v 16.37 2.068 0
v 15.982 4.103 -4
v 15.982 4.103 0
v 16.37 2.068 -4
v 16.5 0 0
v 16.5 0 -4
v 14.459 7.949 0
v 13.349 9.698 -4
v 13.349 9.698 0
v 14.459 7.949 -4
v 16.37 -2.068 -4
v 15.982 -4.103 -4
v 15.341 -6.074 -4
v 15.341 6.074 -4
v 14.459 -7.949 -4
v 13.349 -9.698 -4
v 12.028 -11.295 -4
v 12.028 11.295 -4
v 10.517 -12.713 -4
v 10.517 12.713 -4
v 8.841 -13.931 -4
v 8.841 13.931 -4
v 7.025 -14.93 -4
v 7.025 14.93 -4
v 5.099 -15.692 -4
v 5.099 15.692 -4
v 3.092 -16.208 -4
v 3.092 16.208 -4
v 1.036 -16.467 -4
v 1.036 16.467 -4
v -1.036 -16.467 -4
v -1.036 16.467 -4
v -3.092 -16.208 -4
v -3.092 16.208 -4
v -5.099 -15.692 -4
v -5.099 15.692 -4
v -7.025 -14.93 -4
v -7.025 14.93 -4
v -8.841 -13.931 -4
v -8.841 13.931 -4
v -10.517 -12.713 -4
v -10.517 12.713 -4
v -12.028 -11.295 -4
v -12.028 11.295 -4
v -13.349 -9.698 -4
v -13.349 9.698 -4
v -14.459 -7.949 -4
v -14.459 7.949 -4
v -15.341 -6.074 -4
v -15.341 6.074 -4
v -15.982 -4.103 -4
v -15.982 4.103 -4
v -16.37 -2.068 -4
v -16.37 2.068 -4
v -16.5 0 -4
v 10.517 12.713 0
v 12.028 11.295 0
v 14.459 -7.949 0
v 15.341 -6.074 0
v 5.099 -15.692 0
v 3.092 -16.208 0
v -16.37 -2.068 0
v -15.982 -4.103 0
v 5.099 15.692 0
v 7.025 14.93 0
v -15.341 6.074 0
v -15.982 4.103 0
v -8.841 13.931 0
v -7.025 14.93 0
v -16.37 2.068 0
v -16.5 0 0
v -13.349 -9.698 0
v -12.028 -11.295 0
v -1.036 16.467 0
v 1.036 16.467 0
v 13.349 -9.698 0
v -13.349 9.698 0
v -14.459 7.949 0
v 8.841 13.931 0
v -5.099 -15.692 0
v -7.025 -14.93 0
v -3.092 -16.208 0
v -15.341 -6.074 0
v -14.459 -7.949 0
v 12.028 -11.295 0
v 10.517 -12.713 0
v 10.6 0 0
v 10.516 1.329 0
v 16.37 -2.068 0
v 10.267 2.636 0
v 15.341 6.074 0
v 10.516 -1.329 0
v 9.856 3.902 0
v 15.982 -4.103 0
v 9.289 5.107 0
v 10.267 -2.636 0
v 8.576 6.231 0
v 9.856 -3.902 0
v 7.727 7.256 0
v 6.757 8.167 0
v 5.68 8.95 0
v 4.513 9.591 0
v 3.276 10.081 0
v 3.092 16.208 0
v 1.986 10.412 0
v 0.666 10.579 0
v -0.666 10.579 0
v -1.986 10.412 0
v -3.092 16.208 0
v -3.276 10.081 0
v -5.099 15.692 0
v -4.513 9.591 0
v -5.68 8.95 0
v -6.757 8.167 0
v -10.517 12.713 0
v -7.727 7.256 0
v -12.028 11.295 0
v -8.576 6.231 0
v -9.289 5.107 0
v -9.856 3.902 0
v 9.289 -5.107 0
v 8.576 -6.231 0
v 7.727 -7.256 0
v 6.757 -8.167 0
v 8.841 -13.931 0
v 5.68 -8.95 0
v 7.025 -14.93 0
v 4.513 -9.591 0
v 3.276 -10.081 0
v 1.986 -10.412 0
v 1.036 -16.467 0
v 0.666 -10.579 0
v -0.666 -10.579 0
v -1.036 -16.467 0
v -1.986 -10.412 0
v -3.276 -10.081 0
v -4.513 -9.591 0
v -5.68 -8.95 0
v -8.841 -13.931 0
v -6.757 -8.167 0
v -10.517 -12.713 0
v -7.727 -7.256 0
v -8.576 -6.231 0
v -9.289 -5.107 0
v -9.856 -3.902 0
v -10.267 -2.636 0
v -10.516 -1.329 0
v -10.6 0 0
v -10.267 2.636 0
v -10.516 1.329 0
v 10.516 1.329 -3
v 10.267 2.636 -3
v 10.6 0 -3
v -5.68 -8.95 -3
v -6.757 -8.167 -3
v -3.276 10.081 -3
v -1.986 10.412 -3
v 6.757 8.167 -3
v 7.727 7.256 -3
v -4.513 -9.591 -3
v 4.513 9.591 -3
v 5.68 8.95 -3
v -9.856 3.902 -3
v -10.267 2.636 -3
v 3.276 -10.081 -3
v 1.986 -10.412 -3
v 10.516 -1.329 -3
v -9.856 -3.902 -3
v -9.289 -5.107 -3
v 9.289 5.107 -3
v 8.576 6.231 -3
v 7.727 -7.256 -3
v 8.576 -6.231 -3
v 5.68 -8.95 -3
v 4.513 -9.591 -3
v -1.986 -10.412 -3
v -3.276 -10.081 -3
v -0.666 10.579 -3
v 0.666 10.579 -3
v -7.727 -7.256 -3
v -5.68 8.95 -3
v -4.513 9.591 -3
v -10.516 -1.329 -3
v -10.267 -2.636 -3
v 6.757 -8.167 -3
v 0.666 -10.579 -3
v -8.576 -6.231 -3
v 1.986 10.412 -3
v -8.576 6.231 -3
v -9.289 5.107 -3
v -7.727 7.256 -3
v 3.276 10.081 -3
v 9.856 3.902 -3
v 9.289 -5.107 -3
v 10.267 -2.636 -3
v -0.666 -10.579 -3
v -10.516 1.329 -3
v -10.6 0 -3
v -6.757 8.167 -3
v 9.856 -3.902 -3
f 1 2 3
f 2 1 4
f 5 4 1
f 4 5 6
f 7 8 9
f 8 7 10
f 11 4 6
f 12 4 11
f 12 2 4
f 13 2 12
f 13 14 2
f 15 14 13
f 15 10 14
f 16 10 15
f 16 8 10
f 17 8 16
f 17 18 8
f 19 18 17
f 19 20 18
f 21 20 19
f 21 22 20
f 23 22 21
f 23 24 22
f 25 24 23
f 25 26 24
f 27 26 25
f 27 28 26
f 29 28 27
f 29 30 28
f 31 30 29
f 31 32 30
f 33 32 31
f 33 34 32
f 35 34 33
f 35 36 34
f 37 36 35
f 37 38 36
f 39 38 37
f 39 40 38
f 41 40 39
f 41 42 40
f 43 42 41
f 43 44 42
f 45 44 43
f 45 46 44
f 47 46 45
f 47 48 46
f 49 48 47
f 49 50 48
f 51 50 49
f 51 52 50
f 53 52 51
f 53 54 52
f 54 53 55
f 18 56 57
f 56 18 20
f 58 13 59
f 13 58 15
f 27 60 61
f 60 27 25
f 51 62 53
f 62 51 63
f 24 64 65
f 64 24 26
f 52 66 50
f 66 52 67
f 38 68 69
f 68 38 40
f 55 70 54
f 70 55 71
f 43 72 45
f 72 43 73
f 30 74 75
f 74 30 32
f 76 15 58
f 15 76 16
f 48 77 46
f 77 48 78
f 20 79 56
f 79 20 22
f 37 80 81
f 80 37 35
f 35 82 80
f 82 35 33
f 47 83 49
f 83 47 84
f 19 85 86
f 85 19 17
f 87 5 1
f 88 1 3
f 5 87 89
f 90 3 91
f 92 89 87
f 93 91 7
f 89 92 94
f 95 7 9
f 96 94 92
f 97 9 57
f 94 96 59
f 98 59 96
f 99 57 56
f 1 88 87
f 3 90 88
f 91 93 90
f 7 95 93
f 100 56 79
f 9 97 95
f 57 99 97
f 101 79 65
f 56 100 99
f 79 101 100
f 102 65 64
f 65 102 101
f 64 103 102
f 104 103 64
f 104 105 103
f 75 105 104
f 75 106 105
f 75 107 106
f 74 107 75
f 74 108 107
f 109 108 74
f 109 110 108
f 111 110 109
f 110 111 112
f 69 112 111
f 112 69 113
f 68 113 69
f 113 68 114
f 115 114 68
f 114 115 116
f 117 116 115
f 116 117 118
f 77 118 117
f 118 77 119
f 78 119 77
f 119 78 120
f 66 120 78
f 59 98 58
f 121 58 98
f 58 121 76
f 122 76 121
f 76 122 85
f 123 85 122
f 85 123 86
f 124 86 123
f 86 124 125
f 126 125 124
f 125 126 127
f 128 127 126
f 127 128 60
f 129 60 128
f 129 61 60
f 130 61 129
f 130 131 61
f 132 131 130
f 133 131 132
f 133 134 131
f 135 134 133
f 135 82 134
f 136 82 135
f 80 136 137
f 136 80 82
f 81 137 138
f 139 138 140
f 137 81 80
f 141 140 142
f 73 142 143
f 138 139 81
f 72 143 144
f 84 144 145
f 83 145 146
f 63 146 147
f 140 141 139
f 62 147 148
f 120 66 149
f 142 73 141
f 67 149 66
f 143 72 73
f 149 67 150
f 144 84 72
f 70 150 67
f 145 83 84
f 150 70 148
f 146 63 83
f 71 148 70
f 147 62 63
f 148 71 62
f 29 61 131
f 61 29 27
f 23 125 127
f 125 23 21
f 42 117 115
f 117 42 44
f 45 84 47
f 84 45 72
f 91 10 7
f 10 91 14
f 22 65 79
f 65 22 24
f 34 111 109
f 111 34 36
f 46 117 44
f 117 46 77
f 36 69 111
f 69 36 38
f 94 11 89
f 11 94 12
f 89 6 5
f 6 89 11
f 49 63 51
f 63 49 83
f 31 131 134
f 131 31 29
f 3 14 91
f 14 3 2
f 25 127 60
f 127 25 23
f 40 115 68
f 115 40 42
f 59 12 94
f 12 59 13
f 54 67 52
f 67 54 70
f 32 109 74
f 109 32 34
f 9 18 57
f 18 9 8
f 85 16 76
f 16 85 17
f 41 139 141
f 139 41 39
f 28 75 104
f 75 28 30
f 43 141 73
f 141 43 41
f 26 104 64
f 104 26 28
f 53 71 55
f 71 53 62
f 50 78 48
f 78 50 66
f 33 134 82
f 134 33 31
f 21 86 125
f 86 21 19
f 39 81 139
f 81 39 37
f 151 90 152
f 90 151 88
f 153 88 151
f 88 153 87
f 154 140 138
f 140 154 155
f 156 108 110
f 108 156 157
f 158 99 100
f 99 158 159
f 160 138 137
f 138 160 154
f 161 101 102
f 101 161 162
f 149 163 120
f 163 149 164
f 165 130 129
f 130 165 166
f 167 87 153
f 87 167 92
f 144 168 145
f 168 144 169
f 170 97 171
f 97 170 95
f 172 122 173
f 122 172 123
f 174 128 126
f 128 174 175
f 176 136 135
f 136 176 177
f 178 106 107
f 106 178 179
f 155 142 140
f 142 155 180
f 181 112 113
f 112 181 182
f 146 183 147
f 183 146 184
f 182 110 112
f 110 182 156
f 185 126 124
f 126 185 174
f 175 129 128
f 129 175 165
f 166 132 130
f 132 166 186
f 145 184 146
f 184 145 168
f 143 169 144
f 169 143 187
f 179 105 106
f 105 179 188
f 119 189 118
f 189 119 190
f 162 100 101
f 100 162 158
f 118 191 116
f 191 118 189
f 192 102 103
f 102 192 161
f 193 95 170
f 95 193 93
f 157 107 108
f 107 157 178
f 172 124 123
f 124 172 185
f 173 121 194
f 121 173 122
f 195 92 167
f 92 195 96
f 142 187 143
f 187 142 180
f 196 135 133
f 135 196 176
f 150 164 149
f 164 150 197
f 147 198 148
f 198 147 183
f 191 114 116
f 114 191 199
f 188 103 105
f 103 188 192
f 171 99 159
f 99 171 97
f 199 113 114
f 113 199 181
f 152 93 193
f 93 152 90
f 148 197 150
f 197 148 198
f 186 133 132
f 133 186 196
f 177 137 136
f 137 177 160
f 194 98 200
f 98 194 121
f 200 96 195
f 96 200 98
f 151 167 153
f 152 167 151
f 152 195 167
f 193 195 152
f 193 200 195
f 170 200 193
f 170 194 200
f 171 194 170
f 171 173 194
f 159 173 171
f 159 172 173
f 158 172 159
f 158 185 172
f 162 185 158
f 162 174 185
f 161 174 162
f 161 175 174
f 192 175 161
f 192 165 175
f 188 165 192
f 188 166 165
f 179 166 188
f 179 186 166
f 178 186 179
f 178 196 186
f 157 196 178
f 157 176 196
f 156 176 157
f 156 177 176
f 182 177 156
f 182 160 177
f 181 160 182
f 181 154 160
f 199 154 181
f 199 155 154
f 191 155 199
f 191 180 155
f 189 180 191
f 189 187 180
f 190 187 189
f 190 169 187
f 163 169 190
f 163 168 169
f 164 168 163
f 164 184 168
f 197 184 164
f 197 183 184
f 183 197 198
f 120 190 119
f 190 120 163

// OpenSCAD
$fn = 50;


difference() {
	union() {
		translate(v = [0, 0, -4.0000000000]) {
			cylinder(h = 4, r = 16.5000000000);
		}
	}
	union() {
		#translate(v = [0, 0, -3.0000000000]) {
			cylinder(h = 3, r = 10.6000000000);
		}
	}
}
